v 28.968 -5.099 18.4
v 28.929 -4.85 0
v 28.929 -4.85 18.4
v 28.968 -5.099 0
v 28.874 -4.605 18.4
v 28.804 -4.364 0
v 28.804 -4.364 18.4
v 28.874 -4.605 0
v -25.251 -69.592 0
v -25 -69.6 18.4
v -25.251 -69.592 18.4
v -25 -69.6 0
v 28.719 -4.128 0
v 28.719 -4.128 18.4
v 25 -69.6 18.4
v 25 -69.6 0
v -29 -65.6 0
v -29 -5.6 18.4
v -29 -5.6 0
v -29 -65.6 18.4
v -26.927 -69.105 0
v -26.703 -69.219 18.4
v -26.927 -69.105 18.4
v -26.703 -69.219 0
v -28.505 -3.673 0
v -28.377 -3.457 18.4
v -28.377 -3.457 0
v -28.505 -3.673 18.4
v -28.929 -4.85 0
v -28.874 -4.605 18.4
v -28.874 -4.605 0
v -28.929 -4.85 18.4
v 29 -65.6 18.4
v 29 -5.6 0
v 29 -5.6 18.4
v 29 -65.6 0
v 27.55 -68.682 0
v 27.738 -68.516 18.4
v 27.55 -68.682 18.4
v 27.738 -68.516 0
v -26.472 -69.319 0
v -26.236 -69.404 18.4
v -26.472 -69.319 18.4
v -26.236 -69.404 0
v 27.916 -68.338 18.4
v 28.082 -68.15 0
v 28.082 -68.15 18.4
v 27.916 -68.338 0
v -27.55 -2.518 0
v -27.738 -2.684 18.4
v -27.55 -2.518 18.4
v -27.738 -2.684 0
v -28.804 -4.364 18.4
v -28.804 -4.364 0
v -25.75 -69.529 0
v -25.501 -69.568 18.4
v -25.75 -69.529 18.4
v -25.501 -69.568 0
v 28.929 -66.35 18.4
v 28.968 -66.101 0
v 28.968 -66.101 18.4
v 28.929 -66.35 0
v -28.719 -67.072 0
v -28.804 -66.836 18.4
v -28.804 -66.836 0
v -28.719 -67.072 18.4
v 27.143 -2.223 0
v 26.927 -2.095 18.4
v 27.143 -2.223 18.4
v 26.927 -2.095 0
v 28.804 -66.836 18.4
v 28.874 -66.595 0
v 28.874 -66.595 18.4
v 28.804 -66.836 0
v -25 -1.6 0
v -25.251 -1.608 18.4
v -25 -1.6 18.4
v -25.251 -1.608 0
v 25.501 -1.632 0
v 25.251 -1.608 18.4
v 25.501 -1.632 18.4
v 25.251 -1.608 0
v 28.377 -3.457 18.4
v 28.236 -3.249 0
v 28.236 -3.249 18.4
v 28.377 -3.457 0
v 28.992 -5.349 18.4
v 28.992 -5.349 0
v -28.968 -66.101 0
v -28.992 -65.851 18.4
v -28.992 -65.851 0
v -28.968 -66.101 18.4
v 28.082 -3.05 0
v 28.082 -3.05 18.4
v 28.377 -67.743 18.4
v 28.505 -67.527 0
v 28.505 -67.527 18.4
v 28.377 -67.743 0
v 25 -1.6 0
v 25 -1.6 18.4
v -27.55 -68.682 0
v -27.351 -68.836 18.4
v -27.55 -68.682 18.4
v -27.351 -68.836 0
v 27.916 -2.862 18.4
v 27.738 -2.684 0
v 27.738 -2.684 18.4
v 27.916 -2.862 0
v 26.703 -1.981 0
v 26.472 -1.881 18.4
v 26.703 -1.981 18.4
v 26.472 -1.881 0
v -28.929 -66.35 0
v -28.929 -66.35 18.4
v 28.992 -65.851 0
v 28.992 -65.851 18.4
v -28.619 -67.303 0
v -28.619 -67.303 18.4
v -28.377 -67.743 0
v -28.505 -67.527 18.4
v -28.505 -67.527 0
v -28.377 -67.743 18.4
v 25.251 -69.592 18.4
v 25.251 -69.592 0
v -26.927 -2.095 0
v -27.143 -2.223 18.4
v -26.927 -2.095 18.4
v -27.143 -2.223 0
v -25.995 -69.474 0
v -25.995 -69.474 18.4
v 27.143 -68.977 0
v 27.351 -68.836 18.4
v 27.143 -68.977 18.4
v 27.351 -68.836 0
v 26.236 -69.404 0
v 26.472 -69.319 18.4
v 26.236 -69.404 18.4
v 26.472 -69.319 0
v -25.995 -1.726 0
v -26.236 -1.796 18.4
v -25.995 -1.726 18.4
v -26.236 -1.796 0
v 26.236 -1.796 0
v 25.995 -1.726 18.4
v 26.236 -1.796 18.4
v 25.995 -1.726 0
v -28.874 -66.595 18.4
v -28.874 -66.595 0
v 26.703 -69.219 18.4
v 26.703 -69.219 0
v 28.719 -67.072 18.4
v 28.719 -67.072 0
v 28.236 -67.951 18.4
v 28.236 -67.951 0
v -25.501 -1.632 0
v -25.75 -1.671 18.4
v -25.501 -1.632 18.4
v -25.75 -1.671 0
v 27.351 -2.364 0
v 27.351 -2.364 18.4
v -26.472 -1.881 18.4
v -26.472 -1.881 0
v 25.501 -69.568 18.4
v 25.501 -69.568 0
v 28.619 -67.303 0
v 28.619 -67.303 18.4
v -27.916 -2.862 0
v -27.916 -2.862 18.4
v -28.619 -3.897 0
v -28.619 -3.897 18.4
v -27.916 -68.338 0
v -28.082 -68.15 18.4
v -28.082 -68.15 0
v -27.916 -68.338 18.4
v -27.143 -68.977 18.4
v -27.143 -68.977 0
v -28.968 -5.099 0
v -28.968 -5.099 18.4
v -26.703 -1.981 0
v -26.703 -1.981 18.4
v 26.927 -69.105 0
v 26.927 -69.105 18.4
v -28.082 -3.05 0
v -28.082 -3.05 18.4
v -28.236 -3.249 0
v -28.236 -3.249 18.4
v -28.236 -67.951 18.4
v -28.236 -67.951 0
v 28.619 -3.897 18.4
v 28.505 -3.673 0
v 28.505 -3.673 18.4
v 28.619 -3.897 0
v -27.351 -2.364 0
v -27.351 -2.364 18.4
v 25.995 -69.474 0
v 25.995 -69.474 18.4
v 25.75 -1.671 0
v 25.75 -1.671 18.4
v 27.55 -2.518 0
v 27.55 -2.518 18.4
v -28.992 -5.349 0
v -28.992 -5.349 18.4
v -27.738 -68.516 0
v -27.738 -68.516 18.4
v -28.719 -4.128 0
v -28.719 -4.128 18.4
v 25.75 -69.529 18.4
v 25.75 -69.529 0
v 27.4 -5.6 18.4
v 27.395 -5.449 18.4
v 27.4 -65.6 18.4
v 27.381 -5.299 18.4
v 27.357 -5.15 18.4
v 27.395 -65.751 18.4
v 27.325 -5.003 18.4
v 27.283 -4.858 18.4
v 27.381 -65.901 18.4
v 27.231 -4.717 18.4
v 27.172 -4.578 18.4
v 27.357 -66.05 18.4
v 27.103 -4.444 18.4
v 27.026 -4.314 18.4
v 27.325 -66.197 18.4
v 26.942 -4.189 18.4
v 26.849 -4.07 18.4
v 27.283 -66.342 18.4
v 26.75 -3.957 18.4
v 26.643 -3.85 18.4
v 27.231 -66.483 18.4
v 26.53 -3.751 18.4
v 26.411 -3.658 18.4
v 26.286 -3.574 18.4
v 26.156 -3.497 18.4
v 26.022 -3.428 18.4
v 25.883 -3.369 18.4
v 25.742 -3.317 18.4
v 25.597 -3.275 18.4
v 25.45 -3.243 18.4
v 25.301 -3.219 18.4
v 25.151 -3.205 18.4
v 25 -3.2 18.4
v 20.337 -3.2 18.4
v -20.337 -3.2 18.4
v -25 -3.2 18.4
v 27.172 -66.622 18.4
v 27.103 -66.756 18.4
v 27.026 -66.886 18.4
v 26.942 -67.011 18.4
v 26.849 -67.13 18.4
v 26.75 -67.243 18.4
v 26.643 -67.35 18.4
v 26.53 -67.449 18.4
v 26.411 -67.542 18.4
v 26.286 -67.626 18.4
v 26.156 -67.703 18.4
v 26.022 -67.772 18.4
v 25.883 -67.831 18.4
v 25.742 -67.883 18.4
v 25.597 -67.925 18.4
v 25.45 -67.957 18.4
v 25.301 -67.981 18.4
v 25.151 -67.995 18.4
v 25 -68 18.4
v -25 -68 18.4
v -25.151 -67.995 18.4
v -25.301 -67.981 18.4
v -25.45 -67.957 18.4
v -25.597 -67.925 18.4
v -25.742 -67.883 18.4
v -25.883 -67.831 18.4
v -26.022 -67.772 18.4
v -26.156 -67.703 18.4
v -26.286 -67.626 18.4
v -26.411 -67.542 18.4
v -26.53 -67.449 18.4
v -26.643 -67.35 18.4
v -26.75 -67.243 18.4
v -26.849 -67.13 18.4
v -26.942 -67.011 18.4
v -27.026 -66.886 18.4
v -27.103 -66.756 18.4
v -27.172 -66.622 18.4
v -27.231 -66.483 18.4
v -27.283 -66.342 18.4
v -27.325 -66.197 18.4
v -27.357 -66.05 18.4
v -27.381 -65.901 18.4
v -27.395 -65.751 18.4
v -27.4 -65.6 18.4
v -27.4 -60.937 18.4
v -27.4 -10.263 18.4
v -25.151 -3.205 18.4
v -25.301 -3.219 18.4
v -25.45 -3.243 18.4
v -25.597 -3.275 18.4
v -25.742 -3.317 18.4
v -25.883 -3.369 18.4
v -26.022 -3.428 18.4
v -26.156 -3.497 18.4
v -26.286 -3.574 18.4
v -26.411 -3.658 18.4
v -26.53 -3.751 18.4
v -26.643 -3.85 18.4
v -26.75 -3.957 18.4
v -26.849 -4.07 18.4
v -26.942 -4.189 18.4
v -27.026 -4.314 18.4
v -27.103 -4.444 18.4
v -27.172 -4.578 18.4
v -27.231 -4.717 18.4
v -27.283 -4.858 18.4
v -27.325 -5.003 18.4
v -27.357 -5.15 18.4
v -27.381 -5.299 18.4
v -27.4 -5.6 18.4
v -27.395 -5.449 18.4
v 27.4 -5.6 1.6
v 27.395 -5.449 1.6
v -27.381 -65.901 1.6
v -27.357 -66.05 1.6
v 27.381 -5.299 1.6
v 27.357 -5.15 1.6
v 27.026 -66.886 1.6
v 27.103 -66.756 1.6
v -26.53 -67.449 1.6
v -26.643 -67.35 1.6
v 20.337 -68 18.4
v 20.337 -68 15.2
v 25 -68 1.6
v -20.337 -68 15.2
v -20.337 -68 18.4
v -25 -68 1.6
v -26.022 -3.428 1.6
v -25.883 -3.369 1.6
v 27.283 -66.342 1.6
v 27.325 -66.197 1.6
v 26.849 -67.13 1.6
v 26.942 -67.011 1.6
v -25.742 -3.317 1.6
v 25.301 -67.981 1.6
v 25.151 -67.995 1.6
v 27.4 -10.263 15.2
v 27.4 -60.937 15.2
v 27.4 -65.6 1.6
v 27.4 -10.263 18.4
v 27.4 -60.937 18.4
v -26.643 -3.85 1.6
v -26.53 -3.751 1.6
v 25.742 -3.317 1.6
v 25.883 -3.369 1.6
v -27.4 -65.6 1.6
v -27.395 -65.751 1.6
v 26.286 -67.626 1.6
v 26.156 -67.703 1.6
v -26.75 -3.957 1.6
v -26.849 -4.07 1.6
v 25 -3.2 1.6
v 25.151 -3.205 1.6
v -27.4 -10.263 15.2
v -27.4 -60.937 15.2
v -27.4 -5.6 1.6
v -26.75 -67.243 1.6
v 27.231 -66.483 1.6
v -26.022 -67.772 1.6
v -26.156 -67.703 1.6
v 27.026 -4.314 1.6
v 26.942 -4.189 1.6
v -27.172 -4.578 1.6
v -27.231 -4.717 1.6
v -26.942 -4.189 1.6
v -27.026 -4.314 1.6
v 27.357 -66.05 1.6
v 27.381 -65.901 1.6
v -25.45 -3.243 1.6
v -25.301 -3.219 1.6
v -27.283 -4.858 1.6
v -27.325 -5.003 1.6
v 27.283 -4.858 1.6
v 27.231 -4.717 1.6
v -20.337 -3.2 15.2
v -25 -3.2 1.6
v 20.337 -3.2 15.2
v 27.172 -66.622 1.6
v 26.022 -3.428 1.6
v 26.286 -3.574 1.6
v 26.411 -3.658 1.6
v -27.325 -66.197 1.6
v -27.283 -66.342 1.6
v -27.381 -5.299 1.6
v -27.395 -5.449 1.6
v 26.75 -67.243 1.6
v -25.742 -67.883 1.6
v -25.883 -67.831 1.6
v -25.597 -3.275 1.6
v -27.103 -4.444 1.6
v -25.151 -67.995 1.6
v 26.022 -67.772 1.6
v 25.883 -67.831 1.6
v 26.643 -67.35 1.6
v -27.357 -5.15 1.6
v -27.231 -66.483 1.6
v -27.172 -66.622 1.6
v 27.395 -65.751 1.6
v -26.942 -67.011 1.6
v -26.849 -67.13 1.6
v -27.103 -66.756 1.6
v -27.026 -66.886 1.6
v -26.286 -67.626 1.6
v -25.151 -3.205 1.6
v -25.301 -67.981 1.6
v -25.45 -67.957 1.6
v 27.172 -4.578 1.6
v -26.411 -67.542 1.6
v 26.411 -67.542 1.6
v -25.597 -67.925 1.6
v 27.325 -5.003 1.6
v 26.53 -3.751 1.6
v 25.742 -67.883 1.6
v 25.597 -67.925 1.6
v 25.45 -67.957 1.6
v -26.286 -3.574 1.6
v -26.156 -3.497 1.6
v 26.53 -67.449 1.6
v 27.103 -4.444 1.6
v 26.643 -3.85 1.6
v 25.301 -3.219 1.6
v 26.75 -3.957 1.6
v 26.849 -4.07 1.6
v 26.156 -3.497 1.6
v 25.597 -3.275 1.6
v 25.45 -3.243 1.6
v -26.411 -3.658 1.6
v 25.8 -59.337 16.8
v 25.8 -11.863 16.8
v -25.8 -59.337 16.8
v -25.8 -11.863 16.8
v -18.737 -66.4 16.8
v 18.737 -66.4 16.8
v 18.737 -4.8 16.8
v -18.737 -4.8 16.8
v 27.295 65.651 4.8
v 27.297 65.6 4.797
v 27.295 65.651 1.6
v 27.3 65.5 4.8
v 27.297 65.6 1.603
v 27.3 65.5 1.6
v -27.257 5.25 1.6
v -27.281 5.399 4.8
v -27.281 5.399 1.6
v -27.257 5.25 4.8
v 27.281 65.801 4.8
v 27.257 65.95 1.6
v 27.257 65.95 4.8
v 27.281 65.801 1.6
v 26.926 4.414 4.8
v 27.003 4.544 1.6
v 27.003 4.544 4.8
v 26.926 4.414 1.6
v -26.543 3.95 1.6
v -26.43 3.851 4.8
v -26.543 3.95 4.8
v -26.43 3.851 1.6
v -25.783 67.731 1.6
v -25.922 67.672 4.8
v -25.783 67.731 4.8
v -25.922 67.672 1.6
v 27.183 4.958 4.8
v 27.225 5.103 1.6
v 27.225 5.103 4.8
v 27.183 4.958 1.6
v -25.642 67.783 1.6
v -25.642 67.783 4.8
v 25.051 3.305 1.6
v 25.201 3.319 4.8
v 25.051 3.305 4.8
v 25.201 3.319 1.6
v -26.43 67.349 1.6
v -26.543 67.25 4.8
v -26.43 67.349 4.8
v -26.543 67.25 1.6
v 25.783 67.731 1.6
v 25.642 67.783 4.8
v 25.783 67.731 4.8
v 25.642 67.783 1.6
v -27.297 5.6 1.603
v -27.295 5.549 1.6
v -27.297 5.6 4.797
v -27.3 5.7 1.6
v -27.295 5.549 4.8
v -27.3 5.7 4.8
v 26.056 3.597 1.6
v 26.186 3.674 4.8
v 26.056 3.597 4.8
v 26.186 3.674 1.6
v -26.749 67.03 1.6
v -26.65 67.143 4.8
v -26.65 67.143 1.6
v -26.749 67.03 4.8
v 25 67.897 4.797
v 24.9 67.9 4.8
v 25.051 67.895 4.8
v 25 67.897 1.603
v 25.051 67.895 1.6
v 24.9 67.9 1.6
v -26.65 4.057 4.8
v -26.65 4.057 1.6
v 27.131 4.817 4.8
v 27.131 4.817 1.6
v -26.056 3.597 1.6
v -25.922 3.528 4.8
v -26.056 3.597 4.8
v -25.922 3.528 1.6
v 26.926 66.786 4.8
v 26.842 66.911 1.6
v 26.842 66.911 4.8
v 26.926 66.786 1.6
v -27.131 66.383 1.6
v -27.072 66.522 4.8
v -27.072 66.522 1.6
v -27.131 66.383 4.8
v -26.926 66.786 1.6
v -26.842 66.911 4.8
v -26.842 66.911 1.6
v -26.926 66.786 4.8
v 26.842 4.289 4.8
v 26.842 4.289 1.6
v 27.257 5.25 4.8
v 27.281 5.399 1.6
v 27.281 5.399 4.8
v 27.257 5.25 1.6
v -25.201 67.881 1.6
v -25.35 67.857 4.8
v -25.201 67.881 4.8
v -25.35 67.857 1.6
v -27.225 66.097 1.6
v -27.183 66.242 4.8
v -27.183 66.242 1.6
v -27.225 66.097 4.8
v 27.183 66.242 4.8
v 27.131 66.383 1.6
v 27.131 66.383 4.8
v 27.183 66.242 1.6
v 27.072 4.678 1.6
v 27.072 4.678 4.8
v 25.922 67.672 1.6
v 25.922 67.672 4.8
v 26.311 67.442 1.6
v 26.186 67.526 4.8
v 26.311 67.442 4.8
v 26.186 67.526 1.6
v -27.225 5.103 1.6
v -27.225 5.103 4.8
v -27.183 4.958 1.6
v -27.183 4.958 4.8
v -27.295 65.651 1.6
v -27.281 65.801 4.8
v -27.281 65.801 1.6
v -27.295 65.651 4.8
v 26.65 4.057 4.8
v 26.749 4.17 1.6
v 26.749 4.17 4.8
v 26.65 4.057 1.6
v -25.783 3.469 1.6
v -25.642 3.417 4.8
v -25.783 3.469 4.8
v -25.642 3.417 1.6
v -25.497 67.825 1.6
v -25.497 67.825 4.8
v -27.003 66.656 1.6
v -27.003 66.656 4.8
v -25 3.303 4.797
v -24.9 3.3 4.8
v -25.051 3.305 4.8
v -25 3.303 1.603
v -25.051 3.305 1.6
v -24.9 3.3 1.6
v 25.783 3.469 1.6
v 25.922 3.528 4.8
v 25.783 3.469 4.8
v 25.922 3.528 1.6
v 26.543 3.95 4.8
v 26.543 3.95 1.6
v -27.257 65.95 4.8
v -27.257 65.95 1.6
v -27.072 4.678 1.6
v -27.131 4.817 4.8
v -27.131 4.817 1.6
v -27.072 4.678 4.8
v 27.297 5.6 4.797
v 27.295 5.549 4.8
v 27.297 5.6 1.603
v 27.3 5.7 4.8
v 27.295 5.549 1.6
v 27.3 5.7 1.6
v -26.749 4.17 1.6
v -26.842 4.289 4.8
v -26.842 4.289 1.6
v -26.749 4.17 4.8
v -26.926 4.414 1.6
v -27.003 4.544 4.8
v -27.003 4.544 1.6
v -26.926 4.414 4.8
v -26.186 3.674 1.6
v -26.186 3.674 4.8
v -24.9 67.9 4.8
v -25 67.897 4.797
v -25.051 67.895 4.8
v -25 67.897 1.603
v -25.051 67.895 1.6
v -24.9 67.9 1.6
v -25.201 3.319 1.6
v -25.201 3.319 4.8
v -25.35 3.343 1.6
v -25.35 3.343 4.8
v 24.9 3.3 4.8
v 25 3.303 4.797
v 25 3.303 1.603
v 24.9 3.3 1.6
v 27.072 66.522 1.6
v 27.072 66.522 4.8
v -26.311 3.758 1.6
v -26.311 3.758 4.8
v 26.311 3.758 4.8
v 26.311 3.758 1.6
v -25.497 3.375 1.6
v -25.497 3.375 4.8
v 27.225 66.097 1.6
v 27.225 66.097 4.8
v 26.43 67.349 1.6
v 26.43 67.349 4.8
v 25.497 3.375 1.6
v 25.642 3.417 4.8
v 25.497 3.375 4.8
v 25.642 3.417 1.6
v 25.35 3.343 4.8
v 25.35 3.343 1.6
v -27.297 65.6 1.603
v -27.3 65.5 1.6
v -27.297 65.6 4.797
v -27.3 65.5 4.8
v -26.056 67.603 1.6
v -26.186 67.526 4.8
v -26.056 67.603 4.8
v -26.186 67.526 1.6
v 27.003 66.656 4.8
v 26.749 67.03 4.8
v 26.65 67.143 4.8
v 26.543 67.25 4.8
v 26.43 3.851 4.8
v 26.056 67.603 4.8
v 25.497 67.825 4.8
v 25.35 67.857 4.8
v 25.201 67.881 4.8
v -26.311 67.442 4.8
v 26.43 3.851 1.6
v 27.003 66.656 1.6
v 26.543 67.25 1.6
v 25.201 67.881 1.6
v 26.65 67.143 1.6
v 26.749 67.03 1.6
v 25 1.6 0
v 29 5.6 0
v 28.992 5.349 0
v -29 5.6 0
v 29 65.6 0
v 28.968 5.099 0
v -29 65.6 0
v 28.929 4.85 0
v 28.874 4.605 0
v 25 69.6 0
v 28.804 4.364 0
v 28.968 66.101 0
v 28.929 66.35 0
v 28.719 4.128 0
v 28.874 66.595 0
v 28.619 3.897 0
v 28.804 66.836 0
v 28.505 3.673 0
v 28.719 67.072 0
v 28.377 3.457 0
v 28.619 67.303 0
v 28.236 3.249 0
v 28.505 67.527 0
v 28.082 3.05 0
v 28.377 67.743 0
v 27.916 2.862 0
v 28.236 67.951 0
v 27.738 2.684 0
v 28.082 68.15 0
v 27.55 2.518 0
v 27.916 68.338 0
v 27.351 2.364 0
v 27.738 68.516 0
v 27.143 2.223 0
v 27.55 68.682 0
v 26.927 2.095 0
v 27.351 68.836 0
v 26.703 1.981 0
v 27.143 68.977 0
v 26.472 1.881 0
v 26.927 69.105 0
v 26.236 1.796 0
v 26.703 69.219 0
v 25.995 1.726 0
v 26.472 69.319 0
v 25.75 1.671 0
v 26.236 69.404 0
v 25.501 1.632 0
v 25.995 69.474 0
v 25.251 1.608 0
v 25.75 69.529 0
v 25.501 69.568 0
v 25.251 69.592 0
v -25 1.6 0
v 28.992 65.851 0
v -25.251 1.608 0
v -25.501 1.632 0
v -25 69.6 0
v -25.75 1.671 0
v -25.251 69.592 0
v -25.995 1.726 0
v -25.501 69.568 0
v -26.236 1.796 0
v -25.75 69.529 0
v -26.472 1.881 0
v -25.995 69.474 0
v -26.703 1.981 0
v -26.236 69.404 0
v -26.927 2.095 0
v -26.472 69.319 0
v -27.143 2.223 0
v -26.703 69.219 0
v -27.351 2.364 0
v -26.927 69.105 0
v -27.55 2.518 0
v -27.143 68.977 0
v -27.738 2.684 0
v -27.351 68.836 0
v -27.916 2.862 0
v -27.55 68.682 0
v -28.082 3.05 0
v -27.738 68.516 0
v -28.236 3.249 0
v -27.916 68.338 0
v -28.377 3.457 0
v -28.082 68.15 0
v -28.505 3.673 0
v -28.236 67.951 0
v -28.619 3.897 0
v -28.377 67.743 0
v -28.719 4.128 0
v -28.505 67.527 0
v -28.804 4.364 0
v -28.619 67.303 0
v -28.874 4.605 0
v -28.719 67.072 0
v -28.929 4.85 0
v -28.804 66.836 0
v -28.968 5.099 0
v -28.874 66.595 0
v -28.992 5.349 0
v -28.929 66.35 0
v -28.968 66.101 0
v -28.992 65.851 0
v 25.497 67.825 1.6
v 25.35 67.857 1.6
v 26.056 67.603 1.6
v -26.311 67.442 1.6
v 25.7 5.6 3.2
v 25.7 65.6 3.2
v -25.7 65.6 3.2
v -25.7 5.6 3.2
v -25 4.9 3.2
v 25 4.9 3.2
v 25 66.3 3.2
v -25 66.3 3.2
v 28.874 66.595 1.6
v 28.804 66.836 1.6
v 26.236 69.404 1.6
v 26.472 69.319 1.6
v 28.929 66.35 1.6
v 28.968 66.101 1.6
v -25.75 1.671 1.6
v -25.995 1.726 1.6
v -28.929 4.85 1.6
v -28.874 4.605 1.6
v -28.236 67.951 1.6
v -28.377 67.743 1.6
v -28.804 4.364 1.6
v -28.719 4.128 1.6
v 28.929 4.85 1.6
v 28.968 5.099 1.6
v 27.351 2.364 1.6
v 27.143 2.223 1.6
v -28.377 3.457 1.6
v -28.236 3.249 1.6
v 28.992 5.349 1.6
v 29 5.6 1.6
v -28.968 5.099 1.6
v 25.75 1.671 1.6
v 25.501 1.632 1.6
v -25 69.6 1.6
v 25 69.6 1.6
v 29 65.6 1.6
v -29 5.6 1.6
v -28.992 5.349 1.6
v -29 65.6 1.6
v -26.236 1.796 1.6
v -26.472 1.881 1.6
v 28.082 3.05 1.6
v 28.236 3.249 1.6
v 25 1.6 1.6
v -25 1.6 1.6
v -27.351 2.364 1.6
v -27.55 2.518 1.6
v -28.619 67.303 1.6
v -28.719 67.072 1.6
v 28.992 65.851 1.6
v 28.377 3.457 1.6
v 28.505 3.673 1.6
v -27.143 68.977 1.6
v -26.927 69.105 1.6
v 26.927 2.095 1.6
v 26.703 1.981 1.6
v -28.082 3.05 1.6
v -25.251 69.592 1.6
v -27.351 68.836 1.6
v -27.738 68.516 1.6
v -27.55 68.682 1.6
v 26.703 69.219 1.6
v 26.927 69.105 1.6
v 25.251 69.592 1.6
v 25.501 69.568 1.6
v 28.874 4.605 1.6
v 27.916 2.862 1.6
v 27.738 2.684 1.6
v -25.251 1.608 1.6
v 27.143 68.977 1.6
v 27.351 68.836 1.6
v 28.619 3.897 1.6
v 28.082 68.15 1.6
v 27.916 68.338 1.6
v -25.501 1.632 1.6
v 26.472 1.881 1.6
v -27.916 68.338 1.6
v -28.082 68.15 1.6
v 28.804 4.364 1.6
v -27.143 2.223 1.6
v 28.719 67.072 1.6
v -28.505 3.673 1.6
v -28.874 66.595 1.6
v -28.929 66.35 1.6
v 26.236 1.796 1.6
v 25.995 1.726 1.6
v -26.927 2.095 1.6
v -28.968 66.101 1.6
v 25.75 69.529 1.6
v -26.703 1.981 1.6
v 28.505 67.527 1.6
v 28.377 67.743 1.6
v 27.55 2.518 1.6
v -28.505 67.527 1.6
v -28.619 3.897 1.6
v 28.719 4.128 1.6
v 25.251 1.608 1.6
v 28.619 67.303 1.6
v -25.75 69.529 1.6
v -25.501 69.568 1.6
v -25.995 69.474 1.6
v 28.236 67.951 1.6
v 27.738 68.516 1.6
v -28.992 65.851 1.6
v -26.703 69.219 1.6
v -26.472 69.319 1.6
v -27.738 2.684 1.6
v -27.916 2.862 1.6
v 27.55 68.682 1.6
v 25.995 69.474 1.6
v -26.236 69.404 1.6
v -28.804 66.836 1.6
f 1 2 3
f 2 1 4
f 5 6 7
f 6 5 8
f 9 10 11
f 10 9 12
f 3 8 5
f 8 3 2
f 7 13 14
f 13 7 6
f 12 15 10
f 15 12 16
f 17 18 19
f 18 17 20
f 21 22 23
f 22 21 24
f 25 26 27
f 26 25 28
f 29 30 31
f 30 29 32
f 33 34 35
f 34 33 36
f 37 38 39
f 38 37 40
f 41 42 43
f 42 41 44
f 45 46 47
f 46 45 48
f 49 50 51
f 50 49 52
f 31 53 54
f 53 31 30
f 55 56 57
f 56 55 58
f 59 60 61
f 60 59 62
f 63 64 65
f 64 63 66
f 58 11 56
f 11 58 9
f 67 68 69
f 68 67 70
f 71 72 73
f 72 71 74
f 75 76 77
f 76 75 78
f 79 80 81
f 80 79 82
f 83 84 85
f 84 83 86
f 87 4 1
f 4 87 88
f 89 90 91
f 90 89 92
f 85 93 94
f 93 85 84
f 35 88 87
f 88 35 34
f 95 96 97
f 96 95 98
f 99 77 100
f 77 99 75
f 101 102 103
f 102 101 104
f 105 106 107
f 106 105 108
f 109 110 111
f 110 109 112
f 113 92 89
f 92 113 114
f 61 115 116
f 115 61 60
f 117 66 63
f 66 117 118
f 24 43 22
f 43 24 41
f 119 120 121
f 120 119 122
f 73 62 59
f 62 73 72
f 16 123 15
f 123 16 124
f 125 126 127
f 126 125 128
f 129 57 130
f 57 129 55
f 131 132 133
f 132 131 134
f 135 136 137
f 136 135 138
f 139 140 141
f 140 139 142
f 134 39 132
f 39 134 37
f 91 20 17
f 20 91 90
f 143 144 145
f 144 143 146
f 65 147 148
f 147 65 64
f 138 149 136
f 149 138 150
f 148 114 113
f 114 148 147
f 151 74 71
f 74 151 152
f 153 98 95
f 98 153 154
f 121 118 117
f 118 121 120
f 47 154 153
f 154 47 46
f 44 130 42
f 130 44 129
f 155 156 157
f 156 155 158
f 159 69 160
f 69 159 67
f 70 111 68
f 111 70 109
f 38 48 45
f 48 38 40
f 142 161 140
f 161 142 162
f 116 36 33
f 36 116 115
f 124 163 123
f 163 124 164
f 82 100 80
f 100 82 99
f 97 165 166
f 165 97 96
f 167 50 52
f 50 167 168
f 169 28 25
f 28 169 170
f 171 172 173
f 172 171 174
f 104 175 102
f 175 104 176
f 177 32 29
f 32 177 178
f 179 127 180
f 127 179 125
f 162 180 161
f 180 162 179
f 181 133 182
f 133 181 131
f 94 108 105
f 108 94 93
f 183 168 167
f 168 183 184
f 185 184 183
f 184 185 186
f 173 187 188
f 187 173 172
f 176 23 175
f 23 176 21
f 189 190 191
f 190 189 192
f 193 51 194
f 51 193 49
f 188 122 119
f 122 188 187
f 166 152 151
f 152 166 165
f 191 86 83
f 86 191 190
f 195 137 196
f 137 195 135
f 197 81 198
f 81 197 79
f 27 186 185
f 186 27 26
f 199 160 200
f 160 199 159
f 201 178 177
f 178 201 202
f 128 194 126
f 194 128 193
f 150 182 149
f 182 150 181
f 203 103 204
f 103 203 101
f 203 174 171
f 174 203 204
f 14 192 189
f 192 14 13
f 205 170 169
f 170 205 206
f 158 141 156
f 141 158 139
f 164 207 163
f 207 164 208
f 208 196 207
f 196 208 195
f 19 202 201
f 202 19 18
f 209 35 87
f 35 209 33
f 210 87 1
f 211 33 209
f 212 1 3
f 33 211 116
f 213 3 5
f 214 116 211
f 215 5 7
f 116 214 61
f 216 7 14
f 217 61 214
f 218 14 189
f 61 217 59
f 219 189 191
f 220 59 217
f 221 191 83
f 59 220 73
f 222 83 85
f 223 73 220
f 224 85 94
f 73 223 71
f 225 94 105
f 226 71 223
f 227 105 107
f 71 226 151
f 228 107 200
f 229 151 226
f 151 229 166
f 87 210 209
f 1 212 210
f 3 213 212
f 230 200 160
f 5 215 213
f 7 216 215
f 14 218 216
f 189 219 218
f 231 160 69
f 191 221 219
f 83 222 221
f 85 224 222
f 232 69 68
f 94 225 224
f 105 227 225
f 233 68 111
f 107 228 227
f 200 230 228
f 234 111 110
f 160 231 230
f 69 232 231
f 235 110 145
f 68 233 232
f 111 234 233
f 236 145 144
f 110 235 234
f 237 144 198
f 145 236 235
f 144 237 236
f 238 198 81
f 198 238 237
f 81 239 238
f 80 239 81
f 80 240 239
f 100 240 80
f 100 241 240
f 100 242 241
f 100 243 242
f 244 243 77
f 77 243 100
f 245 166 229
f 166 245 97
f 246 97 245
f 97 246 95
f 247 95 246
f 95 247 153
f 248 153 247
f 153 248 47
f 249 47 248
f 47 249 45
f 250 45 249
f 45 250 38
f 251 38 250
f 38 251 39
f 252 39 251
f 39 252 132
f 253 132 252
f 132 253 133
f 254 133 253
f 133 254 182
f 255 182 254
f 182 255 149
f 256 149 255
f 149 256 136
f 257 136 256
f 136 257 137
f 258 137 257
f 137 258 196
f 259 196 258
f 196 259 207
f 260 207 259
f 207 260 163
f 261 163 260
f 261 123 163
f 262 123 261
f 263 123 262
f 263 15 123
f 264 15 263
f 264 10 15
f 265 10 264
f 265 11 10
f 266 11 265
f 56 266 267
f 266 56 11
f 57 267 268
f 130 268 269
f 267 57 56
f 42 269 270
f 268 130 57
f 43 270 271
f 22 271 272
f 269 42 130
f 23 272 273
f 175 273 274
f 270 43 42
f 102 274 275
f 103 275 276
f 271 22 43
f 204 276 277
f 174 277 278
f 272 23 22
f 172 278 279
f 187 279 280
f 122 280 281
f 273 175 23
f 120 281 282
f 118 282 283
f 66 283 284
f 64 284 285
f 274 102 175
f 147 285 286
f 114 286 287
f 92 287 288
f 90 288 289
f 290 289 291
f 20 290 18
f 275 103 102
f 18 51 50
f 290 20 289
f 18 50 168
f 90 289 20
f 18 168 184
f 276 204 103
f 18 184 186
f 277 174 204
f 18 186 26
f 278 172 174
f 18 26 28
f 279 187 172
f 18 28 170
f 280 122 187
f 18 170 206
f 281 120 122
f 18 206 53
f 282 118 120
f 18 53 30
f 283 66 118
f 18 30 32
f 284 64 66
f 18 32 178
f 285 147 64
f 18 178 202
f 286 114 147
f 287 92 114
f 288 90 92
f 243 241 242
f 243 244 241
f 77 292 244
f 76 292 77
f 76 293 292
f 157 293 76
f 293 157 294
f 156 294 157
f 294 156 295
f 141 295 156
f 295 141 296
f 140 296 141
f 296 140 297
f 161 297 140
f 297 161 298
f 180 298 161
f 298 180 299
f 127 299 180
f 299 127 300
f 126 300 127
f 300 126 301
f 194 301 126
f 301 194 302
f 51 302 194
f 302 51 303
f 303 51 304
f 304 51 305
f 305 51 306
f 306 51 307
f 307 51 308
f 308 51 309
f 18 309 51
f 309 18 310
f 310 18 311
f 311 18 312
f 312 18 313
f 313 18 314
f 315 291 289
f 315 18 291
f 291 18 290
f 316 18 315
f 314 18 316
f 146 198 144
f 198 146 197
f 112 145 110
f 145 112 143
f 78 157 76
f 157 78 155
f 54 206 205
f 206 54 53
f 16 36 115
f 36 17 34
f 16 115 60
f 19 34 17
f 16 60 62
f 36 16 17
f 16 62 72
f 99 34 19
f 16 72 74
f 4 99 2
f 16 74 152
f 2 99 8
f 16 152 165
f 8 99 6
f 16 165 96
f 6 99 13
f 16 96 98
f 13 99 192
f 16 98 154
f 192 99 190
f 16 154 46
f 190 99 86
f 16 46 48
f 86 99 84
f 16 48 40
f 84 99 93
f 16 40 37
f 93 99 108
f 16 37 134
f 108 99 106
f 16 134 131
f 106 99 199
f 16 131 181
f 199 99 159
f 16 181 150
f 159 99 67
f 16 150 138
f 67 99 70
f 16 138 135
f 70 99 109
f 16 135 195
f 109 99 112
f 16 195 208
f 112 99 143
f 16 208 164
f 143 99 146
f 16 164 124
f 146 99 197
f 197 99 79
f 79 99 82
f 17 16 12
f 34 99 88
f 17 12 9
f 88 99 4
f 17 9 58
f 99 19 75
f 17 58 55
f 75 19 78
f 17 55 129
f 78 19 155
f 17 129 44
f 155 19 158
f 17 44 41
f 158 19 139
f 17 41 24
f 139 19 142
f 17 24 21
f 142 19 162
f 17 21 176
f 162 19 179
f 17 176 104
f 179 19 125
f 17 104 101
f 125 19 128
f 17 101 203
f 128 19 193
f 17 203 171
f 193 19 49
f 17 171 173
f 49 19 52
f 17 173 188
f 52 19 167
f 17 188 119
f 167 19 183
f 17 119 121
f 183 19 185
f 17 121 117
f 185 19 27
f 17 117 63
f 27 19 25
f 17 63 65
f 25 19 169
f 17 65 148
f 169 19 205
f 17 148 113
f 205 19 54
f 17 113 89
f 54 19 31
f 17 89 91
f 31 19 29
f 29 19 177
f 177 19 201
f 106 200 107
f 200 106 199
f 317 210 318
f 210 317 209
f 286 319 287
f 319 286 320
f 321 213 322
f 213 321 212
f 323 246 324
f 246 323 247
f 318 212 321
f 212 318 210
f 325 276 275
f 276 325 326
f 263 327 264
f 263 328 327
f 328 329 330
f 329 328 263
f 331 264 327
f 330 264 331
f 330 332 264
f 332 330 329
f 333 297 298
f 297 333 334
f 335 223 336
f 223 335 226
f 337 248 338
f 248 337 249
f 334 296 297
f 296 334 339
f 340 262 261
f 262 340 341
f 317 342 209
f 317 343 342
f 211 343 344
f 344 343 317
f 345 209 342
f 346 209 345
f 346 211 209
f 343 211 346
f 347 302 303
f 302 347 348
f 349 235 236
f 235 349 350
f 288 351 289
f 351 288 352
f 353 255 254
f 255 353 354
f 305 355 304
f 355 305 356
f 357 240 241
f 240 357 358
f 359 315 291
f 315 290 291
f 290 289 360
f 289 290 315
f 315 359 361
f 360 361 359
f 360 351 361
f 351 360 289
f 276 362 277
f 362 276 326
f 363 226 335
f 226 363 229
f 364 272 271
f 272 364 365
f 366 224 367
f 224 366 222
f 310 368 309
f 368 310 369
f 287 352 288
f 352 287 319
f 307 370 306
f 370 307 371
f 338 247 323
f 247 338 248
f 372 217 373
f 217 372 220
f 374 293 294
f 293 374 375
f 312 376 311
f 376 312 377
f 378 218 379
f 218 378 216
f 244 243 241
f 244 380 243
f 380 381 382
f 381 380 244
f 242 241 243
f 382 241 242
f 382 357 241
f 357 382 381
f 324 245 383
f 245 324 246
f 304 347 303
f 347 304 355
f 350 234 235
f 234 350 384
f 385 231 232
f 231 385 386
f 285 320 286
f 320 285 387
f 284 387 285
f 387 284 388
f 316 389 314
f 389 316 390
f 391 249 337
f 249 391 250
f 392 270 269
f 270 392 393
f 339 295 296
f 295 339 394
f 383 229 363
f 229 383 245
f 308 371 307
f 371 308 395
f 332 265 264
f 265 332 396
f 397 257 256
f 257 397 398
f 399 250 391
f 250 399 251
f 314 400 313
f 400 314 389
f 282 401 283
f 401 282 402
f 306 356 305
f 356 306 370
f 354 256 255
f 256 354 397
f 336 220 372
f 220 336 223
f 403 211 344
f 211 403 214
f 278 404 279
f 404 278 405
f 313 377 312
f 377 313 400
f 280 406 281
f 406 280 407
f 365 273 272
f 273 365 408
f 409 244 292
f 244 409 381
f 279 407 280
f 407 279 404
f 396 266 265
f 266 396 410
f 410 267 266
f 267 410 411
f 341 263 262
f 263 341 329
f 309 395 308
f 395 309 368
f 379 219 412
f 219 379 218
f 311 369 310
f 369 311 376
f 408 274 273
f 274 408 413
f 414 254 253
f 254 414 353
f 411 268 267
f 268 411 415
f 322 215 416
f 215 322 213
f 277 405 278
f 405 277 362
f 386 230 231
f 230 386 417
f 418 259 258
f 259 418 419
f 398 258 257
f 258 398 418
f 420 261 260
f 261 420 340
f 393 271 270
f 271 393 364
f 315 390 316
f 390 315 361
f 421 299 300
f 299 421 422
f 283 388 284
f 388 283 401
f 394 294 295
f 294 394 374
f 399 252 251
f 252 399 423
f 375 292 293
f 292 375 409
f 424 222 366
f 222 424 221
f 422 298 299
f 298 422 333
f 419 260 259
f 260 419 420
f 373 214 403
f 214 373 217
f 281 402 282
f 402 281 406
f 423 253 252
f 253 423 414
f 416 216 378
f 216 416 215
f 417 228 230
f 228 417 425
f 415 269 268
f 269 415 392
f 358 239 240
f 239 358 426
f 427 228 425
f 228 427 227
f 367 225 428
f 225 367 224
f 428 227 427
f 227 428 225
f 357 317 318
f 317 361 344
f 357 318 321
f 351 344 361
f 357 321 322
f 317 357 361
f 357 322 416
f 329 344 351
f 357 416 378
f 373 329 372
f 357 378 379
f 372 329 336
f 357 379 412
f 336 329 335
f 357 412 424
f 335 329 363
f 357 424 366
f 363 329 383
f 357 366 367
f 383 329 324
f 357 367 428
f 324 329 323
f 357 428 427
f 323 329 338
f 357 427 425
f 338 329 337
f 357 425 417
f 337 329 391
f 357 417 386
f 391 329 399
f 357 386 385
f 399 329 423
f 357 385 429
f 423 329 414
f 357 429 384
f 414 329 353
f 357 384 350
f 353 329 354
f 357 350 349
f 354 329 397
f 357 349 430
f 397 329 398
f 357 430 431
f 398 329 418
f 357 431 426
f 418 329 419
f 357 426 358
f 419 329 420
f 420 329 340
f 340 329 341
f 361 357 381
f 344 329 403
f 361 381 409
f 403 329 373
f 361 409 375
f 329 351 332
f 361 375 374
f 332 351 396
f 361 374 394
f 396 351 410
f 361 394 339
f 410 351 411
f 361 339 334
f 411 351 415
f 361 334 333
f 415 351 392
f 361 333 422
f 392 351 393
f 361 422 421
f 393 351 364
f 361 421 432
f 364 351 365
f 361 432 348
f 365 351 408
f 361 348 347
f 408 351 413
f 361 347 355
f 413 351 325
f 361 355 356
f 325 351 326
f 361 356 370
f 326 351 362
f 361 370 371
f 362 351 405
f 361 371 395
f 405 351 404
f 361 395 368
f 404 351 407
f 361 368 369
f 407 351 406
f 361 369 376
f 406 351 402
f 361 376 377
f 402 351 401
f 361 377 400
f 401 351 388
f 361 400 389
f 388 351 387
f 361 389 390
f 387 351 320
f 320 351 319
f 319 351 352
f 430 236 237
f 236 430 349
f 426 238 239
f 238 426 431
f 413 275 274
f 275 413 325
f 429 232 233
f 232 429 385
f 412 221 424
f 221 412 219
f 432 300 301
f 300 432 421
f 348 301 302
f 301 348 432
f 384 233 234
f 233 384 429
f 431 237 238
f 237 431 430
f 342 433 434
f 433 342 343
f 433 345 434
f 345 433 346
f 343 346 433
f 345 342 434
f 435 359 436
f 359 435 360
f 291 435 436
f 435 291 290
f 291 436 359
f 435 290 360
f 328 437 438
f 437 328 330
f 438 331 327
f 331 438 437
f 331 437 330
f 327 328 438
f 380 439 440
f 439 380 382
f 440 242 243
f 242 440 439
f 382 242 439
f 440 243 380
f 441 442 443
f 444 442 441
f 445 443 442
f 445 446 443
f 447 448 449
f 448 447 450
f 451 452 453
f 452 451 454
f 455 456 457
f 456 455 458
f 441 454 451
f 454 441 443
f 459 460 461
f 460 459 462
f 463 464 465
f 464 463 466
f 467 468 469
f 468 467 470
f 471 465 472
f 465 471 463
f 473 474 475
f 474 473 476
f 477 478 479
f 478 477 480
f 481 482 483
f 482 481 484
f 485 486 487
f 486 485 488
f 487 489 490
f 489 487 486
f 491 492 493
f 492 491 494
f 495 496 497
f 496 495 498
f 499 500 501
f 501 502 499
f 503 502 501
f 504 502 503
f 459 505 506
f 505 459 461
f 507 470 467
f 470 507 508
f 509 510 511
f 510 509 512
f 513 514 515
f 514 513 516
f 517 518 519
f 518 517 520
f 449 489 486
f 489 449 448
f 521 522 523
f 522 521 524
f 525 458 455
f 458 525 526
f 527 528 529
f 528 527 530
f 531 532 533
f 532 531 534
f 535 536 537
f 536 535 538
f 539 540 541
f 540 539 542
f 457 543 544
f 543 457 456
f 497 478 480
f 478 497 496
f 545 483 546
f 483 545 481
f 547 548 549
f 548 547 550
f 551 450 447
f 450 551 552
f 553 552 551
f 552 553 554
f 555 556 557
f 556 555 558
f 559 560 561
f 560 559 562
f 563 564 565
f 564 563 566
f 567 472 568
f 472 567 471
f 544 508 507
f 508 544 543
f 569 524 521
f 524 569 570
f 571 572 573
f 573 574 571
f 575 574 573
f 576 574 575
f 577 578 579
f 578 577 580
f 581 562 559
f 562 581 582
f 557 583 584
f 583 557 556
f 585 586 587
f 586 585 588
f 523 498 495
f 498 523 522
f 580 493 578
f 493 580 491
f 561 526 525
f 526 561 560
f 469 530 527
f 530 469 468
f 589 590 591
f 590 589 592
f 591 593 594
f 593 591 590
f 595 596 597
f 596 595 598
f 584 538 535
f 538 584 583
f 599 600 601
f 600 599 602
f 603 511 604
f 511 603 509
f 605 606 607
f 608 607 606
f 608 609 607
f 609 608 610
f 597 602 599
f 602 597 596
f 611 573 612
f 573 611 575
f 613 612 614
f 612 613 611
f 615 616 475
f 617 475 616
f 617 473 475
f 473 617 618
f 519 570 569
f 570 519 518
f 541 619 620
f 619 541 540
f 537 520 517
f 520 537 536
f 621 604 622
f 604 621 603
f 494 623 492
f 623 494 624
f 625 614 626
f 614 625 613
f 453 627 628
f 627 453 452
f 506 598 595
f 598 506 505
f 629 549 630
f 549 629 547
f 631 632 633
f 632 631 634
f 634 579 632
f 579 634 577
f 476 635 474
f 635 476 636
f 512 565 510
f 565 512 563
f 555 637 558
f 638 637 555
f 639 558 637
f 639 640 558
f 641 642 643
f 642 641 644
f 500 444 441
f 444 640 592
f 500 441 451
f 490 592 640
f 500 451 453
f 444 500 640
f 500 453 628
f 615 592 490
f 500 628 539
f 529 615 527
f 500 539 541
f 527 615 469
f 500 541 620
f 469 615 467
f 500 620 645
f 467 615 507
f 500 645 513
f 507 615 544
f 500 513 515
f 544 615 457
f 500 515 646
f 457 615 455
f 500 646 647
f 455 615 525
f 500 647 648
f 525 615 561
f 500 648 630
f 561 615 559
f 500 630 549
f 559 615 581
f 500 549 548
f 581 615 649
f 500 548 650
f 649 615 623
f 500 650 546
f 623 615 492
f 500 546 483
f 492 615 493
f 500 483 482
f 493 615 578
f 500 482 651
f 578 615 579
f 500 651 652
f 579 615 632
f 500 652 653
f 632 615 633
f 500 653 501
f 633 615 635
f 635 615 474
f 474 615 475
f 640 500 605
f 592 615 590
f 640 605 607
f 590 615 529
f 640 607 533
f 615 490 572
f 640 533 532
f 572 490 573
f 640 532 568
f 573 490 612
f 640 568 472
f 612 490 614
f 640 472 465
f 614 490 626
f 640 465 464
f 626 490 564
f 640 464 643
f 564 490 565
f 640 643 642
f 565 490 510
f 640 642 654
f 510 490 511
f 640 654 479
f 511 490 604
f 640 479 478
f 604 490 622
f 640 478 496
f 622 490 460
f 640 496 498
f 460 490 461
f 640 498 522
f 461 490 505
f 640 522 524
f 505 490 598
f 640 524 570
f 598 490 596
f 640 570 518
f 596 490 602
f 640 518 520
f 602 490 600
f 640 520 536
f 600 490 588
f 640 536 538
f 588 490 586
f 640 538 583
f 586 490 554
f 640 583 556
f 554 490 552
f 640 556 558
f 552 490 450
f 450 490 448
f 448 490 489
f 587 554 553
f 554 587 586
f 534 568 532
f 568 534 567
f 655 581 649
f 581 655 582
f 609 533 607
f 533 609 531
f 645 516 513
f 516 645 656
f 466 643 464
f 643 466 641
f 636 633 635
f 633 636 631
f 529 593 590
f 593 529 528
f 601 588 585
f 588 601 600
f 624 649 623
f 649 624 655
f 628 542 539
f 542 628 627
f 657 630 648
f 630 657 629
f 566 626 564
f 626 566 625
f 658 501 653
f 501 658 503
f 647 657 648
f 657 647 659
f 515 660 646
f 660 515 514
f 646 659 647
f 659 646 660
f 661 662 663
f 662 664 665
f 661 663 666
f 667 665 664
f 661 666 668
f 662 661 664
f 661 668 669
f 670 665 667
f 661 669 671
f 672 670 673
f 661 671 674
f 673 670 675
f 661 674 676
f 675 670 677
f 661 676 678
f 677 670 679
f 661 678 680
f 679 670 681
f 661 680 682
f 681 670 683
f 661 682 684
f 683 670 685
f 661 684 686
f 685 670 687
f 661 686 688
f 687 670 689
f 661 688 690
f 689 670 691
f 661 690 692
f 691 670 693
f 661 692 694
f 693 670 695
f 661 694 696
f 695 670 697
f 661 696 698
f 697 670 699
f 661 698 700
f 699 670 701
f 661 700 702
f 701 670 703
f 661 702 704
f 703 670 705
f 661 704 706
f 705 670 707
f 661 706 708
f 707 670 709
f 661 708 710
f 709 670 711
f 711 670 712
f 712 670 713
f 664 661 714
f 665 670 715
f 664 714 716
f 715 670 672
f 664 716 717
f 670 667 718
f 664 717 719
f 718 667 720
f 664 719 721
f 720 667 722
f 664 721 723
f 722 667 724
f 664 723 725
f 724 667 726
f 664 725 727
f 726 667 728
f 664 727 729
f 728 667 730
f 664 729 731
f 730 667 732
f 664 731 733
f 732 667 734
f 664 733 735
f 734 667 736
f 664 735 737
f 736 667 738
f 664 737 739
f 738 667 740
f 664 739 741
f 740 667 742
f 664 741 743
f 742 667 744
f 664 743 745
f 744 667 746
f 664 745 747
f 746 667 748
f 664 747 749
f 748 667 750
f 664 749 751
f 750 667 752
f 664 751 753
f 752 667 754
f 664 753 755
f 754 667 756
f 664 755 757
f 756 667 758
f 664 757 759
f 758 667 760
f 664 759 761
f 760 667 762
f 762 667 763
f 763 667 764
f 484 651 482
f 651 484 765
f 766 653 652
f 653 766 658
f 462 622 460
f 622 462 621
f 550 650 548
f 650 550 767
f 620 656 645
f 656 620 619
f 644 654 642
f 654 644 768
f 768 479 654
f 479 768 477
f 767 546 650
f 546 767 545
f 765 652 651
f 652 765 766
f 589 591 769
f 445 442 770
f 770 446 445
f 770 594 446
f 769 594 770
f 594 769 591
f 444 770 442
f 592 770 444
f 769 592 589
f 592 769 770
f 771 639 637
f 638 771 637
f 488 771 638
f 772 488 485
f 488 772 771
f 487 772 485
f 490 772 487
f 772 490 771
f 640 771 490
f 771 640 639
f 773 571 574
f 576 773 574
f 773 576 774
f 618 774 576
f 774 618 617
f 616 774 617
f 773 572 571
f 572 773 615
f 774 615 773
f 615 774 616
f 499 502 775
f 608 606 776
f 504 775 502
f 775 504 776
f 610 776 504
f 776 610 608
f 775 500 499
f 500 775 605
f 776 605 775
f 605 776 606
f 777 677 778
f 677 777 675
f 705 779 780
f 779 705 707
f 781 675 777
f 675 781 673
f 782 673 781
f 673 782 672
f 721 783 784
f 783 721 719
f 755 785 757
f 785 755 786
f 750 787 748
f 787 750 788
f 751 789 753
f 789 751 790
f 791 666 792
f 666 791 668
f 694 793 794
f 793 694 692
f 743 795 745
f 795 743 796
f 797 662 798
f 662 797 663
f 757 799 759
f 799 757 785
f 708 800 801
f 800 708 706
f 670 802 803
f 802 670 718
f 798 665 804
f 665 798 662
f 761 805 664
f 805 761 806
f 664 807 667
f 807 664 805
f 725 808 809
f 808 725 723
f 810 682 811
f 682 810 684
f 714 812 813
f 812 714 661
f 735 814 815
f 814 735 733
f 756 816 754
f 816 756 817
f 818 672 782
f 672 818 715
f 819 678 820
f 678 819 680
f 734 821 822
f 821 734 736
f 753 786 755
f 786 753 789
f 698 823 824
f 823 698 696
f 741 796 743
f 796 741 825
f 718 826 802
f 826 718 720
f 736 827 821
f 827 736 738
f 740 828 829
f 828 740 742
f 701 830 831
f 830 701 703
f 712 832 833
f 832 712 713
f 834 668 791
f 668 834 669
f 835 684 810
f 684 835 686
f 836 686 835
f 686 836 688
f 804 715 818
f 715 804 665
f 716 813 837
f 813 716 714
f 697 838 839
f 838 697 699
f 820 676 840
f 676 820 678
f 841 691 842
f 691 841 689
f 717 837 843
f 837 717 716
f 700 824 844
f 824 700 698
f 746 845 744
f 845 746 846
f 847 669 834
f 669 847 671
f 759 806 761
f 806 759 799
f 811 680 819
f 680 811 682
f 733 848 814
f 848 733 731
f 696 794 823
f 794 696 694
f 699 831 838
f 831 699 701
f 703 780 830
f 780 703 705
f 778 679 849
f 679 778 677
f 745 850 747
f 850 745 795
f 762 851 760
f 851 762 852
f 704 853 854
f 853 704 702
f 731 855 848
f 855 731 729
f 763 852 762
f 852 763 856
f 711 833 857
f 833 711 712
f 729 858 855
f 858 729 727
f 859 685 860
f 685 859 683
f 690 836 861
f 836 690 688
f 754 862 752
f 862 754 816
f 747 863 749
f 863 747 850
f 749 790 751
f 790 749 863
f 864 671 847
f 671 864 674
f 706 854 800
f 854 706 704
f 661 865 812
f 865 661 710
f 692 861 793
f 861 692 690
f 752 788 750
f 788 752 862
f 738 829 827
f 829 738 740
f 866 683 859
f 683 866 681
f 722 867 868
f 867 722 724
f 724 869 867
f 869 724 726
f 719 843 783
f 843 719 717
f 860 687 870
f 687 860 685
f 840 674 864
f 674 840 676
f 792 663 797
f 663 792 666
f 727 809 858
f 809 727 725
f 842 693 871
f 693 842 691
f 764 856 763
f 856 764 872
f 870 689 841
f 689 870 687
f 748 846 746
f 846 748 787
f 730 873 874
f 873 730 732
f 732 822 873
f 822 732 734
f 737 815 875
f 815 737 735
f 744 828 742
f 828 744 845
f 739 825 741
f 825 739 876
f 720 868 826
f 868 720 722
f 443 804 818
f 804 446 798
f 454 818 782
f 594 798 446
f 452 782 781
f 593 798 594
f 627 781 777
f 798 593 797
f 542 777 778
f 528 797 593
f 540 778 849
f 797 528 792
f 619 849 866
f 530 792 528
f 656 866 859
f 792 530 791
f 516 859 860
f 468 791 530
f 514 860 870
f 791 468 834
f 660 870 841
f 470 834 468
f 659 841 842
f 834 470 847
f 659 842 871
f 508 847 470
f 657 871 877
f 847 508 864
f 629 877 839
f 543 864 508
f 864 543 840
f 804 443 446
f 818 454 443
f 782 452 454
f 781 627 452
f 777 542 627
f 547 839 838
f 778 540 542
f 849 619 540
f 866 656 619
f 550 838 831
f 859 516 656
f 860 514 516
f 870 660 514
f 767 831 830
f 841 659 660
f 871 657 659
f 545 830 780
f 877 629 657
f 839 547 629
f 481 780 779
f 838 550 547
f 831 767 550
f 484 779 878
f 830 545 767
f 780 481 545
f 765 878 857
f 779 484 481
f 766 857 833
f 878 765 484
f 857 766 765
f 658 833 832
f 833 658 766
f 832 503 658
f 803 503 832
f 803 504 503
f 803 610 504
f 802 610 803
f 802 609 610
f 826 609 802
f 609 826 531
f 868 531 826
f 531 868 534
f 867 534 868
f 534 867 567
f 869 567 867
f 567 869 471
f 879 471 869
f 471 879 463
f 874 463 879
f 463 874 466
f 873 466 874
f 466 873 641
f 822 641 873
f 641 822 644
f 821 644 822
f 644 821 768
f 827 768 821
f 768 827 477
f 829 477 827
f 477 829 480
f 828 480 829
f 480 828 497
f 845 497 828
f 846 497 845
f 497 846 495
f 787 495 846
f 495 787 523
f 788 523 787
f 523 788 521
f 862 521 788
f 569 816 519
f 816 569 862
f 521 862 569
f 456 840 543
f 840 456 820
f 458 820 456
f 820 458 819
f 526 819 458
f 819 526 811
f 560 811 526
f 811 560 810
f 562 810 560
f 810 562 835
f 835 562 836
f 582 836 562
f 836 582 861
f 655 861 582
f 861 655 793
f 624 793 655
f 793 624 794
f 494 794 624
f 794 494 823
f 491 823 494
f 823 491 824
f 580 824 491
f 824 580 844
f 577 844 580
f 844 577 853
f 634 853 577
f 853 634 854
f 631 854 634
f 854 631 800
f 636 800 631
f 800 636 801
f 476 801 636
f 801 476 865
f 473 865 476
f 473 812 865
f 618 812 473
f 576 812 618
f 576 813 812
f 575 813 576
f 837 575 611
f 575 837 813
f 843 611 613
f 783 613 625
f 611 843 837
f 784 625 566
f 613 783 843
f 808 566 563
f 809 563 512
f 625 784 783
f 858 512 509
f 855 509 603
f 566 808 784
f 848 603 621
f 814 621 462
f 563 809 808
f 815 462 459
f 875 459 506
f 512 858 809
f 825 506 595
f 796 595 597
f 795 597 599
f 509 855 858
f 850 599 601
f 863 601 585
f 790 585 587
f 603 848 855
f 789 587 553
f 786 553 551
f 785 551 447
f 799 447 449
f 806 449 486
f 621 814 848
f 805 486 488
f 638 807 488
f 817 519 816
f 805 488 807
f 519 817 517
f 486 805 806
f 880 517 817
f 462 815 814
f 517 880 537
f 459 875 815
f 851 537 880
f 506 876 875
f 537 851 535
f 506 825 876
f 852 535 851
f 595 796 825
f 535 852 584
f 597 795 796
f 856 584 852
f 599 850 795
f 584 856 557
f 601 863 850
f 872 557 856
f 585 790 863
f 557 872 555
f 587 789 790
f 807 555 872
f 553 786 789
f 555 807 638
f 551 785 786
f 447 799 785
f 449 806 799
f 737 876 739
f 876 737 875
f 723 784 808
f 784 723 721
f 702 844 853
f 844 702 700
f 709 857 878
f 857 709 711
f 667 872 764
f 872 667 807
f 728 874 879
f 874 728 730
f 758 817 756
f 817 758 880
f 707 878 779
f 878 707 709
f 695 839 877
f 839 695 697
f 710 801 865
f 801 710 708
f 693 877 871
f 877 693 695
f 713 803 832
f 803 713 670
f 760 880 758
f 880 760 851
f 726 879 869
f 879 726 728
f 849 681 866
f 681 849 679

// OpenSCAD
// Which one would you like to see?
part = "both"; // [box:Box only, top: Top cover only, both: Box and top cover]

// Size of your printer's nozzle in mm
nozzle_size = 0.8;

// Number of walls the print should have
number_of_walls = 2; // [1:5]

// Tolerance (use 0.2 for FDM)
tolerance = 0.2; // [0.1:0.1:0.4]

// Outer x dimension in mm
x=50+2*number_of_walls*nozzle_size+2*3*nozzle_size;

// Outer y dimension in mm
y=60+2*number_of_walls*nozzle_size+2*3*nozzle_size;

// Outer z dimension in mm
z=12+2*number_of_walls*nozzle_size+2*3*nozzle_size;

// Radius for rounded corners in mm
radius=4; // [1:20]

/* Hidden */
$fn=100;

wall_thickness=nozzle_size*number_of_walls;
hook_thickness = 2*nozzle_size;

top_cover_wall_thickness = hook_thickness + wall_thickness;

module bottom_box () {
    difference(){
        // Solid box
        linear_extrude(z-wall_thickness){
            minkowski(){
                square([x-radius*2,y-radius*2], center=true);
                circle(radius);
            }
        }
        
        // Hollow out
        translate([0,0,wall_thickness]) linear_extrude(z){
            minkowski(){
                square([x-radius*2-wall_thickness*2+wall_thickness*2,y-radius*2-wall_thickness*2+wall_thickness*2], center=true);
                circle(radius-wall_thickness);
            }
        }
    }
    left_hook(); // left hook
    rotate([180,180,0]) left_hook(); // right hook
    front_hook(); // front hook
    rotate([180,180,0]) front_hook(); // back hook
    // TODO: hooks on the other two sides
}

module left_hook () {
    
    translate([(x-2*wall_thickness)/2,-y/2+radius*2,z-wall_thickness]) rotate([0,90,90]) {
        difference(){
            linear_extrude(y-2*radius*2){
    polygon(points=[[0,0],[2*hook_thickness,0],[hook_thickness,hook_thickness]]);
        }
             translate([hook_thickness, hook_thickness, 0]) rotate([45,0,0]) cube(2*hook_thickness, center=true);
             translate([hook_thickness, hook_thickness, y-2*radius*2]) rotate([45,0,0]) cube(2*hook_thickness, center=true);        
        }
    }
}
    

module front_hook () {
    translate([(-x+4*radius)/2,-y/2+wall_thickness,z-wall_thickness]) rotate([90,90,90]) {
        difference(){
        linear_extrude(x-2*radius*2){
    polygon(points=[[0,0],[2*hook_thickness,0],[hook_thickness,hook_thickness]]);
    }
             translate([hook_thickness, hook_thickness, 0]) rotate([45,0,0]) cube(2*hook_thickness, center=true);
             translate([hook_thickness, hook_thickness, x-2*radius*2]) rotate([45,0,0]) cube(2*hook_thickness, center=true);
        }
    }
}


module right_grove () {
    translate([-tolerance/2+(x-2*wall_thickness)/2,-y/2+radius,wall_thickness+hook_thickness*2]) rotate([0,90,90]) linear_extrude(y-2*radius){
    polygon(points=[[0,0],[2*hook_thickness,0],[hook_thickness,hook_thickness]]);
    }
}


module front_grove () {
    translate([(-x+2*radius)/2,-y/2+wall_thickness+tolerance/2,wall_thickness+hook_thickness*2]) rotate([90,90,90]) linear_extrude(x-2*radius){
    polygon(points=[[0,0],[2*hook_thickness,0],[hook_thickness,hook_thickness]]);
    }
}

module top_cover () {

    // Top face
    linear_extrude(wall_thickness){
        minkowski(){
            square([x-radius*2,y-radius*2], center=true);
            circle(radius);
        }
    }
    
    difference(){
        // Wall of top cover
        linear_extrude(wall_thickness+hook_thickness*2){
            minkowski(){
                square([x-radius*2-wall_thickness*2-tolerance+wall_thickness*2,y-radius*2-wall_thickness*2-tolerance+wall_thickness*2], center=true);
                circle(radius-wall_thickness);
            }
        }
        
        // Hollow out
        // TODO: If radius is very small, still hollow out

        translate([0,0,wall_thickness]) linear_extrude(z){
            minkowski(){
                square([x-radius*2-wall_thickness*2-2*top_cover_wall_thickness-tolerance+wall_thickness*2+top_cover_wall_thickness*2,y-radius*2-wall_thickness*2-2*top_cover_wall_thickness-tolerance+wall_thickness*2+top_cover_wall_thickness*2], center=true);
            circle(radius-wall_thickness-top_cover_wall_thickness);
            }
        }
    right_grove();
    rotate([180,180,0]) right_grove();
    front_grove();
    rotate([180,180,0])  front_grove();
    }
  

}

// left_hook();
print_part();

module print_part() {
	if (part == "box") {
		bottom_box();
	} else if (part == "top") {
		top_cover();
	} else if (part == "both") {
		both();
	} else {
		both();
	}
}

module both() {
	translate([0,-(y/2+wall_thickness),0]) bottom_box();
    translate([0,+(y/2+wall_thickness),0]) top_cover();
}
